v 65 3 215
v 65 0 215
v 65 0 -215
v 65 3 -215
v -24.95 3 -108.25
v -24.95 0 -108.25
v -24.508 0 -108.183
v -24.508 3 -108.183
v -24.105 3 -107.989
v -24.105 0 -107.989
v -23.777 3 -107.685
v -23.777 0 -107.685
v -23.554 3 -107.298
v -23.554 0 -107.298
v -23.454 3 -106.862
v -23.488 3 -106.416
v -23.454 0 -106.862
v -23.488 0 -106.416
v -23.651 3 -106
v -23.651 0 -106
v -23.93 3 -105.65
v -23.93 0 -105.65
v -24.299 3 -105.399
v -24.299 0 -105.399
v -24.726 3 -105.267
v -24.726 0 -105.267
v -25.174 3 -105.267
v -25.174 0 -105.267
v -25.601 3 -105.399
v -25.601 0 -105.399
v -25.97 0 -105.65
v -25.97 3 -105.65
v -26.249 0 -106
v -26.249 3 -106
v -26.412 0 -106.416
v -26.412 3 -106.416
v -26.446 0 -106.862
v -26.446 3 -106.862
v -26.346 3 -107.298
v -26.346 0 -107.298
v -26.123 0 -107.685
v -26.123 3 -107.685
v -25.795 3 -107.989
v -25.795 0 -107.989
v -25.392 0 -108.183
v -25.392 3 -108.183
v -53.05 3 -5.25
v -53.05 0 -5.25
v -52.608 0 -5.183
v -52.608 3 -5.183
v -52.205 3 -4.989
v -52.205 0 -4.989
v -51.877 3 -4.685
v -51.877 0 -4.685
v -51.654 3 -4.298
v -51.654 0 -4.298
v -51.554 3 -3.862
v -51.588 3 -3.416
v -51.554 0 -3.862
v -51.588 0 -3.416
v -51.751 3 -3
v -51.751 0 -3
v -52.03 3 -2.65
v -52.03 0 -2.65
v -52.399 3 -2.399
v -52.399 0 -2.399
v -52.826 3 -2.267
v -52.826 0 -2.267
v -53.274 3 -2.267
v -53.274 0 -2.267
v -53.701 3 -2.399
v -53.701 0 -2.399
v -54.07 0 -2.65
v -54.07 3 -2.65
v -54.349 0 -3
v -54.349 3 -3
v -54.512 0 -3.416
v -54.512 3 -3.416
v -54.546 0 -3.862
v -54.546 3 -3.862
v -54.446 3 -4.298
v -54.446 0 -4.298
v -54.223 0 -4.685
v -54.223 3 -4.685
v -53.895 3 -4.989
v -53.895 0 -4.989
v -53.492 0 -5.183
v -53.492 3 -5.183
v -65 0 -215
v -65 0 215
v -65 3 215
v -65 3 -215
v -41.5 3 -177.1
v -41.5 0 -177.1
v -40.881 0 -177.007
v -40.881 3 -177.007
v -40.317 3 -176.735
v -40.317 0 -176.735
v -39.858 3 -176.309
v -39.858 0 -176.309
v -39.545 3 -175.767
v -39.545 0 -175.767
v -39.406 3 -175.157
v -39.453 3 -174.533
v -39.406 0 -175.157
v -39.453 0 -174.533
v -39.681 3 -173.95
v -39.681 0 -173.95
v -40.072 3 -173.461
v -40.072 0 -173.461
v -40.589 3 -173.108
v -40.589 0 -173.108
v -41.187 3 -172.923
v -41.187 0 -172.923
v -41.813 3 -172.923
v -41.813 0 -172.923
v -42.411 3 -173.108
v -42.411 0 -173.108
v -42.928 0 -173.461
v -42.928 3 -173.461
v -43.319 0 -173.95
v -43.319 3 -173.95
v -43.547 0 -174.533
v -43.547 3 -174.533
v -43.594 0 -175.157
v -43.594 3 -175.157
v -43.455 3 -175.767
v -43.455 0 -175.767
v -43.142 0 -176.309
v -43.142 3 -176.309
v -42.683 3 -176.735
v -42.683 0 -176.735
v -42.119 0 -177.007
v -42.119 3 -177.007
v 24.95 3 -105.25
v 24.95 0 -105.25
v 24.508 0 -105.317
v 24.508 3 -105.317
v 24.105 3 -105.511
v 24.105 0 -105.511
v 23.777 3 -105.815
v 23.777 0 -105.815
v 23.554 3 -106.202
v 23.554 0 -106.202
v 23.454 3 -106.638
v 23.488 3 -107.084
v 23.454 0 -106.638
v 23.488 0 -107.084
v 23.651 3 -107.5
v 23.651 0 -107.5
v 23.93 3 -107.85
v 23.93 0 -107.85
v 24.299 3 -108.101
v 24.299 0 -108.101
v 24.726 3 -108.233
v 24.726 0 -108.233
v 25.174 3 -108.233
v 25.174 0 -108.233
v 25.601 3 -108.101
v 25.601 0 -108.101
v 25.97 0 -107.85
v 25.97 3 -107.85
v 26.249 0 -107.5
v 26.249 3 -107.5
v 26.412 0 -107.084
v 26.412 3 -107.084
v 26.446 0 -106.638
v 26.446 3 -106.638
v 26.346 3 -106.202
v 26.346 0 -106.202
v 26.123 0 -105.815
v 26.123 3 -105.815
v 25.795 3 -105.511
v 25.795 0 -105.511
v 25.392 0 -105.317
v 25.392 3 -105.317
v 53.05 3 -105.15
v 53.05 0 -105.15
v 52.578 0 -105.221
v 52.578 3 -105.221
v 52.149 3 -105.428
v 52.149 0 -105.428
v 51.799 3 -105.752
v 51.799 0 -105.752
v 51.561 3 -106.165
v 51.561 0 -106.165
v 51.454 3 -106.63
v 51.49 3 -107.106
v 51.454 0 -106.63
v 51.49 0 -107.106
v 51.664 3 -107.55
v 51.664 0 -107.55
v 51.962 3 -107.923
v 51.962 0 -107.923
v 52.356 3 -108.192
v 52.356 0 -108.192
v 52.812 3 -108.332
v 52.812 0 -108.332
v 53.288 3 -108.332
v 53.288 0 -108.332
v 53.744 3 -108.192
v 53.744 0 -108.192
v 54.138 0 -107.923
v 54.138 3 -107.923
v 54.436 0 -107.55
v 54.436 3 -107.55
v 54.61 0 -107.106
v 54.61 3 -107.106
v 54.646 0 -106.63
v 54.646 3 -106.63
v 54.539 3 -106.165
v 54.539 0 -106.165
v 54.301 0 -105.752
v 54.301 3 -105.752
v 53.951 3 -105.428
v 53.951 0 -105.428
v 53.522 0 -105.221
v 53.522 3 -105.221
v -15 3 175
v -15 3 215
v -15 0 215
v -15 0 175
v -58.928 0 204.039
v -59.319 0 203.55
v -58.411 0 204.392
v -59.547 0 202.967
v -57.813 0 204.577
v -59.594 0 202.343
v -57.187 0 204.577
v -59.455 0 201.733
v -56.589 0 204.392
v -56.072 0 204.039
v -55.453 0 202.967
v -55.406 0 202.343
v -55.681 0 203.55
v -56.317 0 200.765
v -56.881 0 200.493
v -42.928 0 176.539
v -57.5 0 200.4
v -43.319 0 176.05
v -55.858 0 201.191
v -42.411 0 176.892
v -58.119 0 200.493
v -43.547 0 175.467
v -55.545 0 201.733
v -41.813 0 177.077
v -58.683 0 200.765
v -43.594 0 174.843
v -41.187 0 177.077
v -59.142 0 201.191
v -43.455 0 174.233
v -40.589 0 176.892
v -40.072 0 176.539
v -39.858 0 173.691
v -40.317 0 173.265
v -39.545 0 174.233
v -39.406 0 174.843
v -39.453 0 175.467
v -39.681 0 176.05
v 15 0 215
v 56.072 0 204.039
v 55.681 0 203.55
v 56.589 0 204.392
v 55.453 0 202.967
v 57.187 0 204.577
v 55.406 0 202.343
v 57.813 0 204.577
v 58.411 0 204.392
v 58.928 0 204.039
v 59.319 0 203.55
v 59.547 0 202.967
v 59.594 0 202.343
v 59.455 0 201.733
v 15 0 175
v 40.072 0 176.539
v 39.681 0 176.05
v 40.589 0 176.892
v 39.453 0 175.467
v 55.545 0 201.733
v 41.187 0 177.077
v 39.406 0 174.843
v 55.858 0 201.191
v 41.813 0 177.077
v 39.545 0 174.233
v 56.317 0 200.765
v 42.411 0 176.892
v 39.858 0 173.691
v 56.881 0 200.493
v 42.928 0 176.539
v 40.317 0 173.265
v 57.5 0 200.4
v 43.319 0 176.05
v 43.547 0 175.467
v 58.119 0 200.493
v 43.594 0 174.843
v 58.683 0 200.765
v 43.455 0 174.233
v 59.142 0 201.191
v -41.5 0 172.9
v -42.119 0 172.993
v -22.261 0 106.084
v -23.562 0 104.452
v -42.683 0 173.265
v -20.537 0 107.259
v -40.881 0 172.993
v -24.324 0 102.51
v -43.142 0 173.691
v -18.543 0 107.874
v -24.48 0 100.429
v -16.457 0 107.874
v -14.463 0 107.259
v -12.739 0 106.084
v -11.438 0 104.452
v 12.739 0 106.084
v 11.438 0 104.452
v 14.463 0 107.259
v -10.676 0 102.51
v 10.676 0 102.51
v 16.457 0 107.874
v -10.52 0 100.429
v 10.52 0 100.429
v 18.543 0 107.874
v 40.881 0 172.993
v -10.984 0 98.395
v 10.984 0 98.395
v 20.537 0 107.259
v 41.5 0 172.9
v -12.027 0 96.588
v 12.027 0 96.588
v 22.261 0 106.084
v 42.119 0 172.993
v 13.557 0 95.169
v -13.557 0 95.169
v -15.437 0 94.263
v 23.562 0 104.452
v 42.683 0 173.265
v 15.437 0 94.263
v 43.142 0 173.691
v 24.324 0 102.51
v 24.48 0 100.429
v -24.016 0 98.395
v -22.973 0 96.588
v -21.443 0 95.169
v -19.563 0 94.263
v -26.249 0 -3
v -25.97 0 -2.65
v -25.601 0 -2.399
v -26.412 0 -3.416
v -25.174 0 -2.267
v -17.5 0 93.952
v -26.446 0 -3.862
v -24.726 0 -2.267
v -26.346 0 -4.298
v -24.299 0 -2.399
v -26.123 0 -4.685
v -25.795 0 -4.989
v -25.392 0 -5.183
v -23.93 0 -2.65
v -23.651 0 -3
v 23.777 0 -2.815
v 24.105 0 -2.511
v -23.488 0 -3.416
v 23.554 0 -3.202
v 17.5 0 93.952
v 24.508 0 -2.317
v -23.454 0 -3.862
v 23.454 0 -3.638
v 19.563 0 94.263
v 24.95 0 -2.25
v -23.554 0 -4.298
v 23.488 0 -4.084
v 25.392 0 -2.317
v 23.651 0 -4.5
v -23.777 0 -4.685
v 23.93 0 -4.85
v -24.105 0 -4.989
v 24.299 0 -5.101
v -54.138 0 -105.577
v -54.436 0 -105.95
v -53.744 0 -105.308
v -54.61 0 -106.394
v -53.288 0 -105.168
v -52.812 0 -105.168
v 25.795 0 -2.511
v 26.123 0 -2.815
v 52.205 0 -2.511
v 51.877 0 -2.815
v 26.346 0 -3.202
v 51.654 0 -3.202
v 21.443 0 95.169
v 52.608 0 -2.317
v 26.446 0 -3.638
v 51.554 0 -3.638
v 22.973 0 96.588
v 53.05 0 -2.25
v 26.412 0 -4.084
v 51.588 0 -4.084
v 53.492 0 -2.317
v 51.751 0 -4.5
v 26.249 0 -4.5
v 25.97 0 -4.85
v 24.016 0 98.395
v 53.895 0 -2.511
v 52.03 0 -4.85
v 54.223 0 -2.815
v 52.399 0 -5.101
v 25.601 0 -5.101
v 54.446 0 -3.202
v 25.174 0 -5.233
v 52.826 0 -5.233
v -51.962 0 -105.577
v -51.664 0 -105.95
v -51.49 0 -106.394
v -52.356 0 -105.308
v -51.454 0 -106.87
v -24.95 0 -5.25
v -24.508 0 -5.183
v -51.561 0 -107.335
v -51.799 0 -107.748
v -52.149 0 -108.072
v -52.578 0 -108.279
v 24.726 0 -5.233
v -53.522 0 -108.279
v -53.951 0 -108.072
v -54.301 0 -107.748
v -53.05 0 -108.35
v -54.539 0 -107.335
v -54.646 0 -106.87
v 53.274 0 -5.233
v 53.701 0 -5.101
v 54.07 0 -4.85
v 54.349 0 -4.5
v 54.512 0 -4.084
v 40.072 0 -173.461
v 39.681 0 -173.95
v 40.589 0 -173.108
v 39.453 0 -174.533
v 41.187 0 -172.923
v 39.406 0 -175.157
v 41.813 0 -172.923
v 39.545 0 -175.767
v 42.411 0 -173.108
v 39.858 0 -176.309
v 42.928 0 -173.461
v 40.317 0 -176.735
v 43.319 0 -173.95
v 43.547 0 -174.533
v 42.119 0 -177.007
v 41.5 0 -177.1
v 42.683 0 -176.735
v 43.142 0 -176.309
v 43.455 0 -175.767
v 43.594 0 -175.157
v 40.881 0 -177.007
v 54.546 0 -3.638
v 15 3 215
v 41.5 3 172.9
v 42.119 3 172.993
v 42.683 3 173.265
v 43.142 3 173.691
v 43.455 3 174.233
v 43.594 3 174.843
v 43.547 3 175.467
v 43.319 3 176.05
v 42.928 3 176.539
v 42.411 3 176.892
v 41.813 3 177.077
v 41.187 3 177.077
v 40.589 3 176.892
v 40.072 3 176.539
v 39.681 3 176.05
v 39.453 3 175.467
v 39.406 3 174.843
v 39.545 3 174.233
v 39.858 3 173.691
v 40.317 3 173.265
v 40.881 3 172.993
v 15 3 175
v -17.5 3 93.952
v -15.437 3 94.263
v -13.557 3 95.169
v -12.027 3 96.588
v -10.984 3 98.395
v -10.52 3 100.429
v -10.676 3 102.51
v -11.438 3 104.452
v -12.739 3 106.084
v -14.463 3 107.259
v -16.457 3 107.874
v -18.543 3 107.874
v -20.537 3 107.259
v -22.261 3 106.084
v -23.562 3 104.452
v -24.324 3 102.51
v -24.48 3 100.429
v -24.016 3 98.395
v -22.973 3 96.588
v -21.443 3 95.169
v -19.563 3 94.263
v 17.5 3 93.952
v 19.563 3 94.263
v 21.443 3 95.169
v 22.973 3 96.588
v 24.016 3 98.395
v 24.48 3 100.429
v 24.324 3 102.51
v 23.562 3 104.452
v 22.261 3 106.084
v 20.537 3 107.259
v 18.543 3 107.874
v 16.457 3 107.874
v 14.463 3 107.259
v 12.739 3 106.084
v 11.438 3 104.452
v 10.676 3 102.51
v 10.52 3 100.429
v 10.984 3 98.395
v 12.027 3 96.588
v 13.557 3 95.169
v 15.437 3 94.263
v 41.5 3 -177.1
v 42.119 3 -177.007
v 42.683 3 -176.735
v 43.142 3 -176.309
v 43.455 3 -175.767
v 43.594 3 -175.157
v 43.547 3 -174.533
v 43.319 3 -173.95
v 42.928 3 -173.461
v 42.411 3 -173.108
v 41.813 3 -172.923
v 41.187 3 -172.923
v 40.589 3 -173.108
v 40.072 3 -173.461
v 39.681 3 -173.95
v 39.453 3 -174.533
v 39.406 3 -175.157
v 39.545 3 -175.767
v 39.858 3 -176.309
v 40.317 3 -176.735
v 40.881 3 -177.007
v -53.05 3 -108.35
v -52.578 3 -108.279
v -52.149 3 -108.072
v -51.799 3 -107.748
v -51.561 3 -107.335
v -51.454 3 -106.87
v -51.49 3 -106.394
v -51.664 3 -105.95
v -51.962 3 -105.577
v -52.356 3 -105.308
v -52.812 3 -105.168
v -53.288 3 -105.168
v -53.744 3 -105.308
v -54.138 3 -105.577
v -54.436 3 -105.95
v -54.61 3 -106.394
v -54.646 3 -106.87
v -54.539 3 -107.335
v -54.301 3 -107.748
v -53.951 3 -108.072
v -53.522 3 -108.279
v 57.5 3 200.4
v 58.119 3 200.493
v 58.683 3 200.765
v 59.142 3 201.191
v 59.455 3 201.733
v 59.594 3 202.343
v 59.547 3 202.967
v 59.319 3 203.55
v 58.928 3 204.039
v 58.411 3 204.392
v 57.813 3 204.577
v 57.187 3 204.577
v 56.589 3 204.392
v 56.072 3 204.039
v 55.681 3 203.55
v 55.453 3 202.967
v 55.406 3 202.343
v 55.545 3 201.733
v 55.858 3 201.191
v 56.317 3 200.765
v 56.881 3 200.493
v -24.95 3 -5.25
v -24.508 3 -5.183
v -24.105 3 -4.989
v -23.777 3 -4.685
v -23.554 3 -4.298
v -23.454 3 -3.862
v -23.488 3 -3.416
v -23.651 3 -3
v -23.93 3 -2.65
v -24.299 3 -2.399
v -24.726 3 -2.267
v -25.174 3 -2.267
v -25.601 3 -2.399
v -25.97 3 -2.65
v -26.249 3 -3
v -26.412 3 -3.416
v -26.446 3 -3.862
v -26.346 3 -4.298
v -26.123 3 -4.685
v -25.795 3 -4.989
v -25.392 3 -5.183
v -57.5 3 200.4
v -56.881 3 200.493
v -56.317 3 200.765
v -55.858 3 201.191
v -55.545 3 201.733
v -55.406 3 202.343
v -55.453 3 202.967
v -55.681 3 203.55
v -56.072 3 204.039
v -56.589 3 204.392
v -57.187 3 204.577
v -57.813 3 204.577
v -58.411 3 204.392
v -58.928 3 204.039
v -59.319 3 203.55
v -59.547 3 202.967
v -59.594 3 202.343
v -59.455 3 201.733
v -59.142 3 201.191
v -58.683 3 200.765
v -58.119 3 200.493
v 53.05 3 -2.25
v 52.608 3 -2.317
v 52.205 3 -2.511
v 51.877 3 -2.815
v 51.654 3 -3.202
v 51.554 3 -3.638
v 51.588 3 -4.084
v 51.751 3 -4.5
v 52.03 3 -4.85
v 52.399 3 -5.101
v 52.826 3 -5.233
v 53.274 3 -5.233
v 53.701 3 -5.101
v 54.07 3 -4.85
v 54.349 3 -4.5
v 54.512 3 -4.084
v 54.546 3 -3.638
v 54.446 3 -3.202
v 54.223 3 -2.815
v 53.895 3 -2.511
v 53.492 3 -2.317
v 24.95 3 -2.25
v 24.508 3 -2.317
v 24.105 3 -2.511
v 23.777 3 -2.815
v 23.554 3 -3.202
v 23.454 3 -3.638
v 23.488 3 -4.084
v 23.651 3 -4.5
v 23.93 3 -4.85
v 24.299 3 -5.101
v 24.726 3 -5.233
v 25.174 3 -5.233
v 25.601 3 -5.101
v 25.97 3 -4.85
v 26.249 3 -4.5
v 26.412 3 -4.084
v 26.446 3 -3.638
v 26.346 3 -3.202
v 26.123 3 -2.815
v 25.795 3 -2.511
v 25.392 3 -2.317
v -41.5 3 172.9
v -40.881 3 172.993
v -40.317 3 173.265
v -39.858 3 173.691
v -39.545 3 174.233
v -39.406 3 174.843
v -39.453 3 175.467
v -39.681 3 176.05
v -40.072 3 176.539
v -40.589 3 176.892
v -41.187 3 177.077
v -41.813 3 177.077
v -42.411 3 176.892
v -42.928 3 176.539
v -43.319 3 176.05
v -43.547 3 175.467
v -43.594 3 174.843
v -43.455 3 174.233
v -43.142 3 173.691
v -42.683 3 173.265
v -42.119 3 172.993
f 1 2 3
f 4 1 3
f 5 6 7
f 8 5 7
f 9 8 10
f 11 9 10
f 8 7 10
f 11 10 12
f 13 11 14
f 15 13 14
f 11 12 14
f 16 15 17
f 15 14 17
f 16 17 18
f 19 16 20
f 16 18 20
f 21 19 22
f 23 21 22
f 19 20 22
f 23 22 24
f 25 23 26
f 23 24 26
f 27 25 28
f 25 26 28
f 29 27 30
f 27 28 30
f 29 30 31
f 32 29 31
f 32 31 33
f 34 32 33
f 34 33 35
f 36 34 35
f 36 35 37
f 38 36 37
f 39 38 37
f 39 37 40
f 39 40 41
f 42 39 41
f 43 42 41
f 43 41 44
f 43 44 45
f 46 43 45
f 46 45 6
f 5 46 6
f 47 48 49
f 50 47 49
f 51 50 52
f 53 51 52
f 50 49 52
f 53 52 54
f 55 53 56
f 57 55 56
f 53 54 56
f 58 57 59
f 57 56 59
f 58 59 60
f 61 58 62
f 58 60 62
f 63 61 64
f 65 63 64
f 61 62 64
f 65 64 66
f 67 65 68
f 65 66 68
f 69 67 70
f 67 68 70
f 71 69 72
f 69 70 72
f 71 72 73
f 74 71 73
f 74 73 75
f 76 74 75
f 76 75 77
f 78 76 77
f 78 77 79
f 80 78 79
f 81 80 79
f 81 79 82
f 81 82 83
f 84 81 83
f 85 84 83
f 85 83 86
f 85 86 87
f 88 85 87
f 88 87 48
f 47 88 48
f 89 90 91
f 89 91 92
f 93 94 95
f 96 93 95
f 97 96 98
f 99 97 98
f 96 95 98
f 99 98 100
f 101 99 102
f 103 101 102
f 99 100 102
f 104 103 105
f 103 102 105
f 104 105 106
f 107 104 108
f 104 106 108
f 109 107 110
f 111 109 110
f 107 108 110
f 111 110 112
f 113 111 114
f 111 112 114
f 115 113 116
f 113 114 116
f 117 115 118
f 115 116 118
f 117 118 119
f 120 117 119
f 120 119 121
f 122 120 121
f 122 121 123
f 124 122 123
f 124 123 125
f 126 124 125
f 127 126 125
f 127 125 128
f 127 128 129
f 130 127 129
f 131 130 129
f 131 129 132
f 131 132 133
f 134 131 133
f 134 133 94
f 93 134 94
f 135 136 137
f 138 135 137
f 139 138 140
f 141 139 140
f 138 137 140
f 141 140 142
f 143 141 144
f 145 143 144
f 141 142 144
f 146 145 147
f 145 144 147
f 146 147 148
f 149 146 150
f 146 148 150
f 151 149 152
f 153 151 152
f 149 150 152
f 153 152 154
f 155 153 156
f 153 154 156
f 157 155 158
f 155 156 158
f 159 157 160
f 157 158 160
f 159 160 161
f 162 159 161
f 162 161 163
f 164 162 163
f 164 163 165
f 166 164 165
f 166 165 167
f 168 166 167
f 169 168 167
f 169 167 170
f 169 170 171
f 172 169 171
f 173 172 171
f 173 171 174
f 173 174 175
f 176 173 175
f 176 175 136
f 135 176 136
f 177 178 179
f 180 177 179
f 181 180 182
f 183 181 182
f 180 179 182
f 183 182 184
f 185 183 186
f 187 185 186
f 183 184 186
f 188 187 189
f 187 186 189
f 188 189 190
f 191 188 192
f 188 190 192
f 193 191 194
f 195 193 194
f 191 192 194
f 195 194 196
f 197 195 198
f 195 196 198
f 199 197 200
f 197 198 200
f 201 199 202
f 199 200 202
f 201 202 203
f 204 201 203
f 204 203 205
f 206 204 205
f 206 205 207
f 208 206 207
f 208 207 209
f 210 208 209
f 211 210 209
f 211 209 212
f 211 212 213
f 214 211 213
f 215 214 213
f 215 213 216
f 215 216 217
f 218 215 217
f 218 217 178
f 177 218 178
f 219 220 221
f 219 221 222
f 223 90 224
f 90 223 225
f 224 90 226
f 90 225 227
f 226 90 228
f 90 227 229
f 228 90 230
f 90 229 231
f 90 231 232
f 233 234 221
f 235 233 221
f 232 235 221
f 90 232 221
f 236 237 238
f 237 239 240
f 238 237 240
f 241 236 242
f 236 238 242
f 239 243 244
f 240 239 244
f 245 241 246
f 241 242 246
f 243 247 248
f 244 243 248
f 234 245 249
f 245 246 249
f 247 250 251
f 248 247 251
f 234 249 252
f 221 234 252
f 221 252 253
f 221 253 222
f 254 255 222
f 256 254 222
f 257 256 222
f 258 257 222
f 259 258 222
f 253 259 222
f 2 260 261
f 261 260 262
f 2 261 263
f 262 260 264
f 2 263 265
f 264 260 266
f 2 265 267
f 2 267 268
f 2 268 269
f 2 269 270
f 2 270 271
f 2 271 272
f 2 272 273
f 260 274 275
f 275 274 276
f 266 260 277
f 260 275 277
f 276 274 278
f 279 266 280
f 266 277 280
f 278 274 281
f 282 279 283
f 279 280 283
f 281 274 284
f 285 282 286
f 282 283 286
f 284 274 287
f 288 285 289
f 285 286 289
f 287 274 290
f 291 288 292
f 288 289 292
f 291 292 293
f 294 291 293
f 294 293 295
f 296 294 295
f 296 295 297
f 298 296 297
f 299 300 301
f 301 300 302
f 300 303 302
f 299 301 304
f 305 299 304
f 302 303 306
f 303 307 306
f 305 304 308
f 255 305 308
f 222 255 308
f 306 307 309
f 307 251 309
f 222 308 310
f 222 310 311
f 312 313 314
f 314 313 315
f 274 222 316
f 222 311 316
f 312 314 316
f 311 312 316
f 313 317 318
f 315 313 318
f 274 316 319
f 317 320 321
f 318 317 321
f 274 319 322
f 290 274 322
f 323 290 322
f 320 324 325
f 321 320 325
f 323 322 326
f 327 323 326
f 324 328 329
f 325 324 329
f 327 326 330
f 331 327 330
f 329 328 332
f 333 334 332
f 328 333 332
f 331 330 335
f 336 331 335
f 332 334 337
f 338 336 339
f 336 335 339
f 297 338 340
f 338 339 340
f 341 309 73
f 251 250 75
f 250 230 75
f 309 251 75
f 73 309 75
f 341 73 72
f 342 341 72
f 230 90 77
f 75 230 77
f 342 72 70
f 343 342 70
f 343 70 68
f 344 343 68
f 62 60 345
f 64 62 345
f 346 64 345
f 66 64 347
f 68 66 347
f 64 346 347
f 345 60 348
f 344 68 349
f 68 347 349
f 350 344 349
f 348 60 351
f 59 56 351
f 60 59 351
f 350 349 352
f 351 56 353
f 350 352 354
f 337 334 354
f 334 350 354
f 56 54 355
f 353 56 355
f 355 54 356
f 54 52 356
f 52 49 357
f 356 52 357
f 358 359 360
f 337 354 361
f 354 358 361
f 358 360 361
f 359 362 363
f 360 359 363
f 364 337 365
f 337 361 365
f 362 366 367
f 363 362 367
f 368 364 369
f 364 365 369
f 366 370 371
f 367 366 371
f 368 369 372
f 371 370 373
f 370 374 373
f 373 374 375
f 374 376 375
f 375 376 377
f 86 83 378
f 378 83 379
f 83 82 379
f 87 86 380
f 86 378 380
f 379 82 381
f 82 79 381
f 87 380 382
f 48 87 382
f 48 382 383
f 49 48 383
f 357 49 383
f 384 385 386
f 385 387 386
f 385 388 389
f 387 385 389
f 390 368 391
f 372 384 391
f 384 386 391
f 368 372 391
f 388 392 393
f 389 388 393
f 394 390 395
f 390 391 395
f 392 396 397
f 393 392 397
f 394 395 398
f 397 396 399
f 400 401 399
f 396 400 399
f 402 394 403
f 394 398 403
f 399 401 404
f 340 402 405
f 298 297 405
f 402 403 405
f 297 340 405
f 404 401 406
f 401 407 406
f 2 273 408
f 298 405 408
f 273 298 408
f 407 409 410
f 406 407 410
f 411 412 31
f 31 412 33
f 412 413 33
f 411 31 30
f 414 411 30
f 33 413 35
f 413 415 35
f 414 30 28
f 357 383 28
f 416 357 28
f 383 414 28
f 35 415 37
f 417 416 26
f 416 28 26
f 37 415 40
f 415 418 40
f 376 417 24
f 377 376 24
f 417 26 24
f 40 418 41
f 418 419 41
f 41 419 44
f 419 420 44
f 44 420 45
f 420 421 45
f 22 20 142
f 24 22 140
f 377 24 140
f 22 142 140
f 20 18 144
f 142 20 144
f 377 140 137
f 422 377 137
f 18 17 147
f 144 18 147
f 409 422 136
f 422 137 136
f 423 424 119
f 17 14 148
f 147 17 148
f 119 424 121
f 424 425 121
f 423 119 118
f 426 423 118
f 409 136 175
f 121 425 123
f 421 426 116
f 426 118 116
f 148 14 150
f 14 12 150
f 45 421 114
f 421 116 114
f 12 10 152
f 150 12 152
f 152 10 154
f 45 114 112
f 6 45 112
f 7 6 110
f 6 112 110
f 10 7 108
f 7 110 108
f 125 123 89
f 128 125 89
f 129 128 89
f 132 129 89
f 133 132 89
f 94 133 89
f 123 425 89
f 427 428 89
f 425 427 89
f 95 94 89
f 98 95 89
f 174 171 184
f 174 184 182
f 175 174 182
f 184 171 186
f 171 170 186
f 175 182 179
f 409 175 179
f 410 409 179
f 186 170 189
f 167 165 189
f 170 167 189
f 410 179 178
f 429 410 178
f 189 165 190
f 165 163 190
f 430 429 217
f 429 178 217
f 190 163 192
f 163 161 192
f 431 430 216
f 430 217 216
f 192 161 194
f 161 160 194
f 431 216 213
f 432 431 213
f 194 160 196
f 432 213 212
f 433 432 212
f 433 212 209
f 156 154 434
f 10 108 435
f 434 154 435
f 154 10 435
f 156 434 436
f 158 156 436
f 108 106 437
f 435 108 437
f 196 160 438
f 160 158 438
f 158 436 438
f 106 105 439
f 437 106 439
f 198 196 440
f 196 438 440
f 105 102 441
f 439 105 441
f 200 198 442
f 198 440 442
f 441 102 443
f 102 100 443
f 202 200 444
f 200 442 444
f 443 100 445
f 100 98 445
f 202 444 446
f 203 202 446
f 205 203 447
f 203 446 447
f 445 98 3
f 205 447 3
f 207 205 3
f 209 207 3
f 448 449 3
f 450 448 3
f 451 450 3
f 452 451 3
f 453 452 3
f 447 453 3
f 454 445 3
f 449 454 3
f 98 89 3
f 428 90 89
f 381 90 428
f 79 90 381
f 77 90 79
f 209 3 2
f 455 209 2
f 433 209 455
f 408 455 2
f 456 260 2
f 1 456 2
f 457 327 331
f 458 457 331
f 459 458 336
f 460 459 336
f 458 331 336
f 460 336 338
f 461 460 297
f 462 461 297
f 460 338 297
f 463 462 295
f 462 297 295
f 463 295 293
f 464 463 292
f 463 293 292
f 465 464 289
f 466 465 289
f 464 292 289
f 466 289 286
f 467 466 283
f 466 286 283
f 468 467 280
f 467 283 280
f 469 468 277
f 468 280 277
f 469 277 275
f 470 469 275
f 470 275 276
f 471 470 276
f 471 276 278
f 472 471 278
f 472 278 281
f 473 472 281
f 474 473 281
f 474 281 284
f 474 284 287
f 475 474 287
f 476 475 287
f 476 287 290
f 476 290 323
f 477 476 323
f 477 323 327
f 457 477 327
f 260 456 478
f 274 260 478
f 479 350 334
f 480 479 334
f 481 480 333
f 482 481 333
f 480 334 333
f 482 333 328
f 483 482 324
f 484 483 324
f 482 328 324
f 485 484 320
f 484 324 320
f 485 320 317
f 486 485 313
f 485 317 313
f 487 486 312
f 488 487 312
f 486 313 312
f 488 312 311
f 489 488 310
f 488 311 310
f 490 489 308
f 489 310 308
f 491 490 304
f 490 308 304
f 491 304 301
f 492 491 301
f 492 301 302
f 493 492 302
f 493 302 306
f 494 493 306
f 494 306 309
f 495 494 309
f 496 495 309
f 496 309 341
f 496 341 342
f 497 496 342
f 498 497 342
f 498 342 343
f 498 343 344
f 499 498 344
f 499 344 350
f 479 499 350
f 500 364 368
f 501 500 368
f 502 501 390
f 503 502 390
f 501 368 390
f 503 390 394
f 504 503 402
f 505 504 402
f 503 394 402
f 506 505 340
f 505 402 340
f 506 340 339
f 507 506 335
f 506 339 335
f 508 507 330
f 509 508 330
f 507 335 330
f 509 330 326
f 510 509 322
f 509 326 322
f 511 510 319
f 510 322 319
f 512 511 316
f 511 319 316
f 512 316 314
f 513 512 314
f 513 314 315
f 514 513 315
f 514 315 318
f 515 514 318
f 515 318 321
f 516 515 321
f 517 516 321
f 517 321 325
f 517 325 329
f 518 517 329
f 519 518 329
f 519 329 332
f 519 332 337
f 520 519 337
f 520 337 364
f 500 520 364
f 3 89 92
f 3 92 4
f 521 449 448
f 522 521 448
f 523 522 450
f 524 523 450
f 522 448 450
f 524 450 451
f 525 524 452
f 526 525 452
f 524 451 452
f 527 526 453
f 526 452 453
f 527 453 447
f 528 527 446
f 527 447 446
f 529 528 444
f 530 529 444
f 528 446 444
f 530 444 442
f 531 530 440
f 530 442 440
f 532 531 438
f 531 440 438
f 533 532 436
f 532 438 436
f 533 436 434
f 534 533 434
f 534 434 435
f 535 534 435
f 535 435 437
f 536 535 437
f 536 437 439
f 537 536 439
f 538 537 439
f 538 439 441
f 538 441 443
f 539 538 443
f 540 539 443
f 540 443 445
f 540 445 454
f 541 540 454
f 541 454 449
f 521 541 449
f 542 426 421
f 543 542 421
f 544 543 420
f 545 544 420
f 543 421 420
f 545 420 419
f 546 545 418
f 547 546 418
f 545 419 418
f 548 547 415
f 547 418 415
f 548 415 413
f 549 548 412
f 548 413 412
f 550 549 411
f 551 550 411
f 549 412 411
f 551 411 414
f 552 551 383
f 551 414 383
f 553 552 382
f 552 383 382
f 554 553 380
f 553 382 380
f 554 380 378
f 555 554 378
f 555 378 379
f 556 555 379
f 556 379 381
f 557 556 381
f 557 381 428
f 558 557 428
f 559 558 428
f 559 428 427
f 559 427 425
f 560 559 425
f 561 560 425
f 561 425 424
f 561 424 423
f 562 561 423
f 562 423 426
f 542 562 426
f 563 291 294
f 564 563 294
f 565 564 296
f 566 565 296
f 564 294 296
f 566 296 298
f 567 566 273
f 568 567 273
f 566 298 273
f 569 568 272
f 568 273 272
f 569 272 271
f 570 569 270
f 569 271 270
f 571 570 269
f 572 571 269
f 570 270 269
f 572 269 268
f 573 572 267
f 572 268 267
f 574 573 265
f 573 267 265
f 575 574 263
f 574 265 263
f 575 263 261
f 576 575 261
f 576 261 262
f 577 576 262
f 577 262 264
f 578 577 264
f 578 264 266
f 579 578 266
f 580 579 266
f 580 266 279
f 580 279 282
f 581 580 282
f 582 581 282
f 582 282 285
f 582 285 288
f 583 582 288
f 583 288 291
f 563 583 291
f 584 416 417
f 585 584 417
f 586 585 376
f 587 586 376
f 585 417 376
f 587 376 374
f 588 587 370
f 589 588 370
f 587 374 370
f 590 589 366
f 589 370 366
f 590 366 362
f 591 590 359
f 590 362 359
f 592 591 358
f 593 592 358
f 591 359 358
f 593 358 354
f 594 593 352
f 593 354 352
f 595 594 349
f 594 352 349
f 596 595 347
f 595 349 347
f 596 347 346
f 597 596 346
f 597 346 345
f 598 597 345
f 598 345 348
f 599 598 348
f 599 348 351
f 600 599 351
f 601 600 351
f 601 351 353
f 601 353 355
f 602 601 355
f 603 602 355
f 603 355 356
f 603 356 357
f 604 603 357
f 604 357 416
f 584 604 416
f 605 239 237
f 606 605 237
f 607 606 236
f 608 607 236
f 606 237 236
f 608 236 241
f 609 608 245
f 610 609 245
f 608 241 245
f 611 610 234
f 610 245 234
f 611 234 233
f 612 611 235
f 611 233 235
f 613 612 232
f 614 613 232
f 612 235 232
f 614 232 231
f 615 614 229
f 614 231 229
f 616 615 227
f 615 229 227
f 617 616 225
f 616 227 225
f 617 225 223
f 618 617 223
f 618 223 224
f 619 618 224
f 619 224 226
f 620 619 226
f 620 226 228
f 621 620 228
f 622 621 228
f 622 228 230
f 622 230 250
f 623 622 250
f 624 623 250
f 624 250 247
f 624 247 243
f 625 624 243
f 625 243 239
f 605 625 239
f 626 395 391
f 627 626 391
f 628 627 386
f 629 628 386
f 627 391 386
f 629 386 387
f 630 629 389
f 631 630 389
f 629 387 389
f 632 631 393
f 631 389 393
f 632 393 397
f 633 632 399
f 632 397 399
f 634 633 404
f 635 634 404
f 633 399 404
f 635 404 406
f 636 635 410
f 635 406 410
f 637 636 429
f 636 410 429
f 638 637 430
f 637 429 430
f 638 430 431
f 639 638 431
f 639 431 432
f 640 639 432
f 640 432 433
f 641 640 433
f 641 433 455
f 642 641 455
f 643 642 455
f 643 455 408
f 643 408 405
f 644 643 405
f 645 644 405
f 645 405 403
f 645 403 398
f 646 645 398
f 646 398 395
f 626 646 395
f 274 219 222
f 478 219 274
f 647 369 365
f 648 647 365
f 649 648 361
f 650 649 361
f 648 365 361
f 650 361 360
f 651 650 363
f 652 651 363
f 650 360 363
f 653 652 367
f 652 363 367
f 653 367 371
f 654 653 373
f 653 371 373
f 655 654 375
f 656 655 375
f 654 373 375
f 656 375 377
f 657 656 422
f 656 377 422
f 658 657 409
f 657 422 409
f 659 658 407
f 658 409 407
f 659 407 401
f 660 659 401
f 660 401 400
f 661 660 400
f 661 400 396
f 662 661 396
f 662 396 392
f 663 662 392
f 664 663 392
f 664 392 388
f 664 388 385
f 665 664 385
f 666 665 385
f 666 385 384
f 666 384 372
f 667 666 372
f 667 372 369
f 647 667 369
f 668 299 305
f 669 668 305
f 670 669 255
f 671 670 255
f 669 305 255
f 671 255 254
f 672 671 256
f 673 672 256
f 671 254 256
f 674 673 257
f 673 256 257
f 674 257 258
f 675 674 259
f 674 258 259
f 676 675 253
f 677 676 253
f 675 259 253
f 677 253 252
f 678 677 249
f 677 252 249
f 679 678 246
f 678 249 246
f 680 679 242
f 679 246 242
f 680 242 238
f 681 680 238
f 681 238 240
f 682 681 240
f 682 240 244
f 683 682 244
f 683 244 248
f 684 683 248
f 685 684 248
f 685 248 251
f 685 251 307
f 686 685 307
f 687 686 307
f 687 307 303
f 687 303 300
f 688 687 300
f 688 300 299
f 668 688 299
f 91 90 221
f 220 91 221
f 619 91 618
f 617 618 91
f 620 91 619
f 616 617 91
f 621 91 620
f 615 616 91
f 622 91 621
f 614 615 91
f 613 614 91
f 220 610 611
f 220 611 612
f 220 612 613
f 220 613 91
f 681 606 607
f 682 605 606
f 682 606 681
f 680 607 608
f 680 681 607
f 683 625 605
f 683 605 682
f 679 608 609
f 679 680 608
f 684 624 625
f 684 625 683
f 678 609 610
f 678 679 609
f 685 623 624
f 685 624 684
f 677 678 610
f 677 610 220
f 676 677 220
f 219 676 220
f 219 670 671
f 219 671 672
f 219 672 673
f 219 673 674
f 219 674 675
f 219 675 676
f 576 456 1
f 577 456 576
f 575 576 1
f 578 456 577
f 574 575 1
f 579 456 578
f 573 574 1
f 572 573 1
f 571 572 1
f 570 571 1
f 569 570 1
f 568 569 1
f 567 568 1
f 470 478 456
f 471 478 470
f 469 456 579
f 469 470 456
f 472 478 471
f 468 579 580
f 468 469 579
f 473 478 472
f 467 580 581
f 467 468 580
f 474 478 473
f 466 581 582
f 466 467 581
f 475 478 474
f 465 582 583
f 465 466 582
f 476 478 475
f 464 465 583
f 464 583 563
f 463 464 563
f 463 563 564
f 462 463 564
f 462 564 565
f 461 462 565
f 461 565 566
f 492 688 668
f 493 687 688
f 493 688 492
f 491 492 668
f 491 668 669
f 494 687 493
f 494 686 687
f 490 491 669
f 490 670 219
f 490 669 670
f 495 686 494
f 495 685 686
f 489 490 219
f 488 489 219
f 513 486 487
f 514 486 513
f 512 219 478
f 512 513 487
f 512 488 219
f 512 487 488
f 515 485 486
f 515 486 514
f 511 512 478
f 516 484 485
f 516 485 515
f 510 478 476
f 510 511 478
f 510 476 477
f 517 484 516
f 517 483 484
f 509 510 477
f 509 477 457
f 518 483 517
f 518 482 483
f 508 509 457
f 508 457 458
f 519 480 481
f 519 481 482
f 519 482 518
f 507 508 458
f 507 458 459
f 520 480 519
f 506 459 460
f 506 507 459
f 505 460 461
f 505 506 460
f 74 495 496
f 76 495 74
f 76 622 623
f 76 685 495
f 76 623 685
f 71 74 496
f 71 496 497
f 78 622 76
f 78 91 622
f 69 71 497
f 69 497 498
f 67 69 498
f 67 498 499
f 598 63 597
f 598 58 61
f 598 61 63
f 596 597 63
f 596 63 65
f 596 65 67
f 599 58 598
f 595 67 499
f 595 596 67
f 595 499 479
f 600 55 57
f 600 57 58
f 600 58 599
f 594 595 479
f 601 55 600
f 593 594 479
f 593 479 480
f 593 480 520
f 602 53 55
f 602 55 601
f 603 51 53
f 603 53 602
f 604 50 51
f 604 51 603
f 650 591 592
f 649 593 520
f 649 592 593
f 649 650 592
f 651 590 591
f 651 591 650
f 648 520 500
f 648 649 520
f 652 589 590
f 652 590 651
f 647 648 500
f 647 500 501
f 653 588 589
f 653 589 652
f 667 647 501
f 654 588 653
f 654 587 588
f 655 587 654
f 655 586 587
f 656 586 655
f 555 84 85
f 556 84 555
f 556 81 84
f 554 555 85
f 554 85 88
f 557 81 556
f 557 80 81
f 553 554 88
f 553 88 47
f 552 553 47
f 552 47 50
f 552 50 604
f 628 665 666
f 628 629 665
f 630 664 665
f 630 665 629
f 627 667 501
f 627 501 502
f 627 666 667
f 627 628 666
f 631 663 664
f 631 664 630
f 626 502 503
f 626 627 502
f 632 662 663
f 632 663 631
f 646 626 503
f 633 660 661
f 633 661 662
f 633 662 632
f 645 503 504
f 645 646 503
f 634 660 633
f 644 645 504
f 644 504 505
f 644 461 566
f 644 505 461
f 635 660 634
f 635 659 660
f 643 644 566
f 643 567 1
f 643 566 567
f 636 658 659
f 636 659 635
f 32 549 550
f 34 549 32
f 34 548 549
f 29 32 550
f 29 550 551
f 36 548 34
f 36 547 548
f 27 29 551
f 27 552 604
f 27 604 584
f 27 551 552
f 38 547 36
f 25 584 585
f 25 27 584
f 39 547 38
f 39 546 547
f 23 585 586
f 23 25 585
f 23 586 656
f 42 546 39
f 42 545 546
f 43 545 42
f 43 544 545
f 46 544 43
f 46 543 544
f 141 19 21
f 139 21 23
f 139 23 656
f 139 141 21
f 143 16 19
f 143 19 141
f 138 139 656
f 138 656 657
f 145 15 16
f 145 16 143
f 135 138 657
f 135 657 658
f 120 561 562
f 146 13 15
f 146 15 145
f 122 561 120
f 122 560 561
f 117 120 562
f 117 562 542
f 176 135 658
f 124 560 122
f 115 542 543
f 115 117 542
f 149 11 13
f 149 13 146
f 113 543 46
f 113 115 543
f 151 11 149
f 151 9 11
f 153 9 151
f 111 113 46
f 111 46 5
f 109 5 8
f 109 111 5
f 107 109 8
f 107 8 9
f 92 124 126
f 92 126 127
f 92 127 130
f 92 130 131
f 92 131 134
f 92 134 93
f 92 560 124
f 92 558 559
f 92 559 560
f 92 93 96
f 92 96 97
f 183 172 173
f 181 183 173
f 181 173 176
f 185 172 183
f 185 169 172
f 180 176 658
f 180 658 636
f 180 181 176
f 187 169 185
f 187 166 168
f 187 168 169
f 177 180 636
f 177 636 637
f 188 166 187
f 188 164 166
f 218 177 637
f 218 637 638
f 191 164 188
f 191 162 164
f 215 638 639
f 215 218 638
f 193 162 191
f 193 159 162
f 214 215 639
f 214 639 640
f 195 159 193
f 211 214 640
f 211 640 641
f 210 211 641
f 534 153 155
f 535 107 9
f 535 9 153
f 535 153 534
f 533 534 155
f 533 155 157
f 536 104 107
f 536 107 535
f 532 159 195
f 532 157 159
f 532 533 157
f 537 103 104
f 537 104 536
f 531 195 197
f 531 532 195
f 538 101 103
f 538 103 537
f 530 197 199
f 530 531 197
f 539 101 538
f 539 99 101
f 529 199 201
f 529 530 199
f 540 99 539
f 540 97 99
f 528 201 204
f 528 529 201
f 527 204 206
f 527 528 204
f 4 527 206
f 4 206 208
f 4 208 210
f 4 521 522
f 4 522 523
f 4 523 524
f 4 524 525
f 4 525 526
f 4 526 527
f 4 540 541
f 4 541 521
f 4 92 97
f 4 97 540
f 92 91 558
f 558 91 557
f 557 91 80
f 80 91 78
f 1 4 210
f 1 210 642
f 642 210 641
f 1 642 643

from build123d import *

# Parameters (mm, degrees)
SKETCH1_W           = 130
SKETCH1_H           = 430
BOSS_EXTRUDE1_DEPTH = 3
SKETCH2_W           = 30
SKETCH2_H           = 40
CUT_EXTRUDE1_DEPTH  = 10
SKETCH3_R           = 1.5
SKETCH3_R_2         = 1.6
SKETCH3_R_3         = 2.1
CUT_EXTRUDE2_DEPTH  = 10
SKETCH4_R           = 7
CUT_EXTRUDE3_DEPTH  = 10


with BuildPart() as part:
    # Sketch1 → Boss-Extrude1 (new body)
    with BuildSketch(Plane(origin=(0, 0, 0), x_dir=(1, 0, 0), z_dir=(0, 1, 0))):
        Rectangle(SKETCH1_W, SKETCH1_H)
    extrude(amount=BOSS_EXTRUDE1_DEPTH)

    # Sketch2 → Cut-Extrude1 (cut)
    with BuildSketch(Plane(origin=(0, 3, 0), x_dir=(1, 0, 0), z_dir=(0, 1, 0))):
        with Locations((0, -195)):
            Rectangle(SKETCH2_W, SKETCH2_H)
    extrude(amount=-CUT_EXTRUDE1_DEPTH, mode=Mode.SUBTRACT)

    # Sketch3 → Cut-Extrude2 (cut)
    with BuildSketch(Plane.XZ):
        with Locations(Location((-53.05, -3.75, 0), (0, 0, 270))):
            Circle(SKETCH3_R)
        with Locations(Location((-24.95, -3.75, 0), (0, 0, 270))):
            Circle(SKETCH3_R)
        with Locations(Location((-53.05, -106.75, 0), (0, 0, 270))):
            Circle(SKETCH3_R_2)
        with Locations(Location((-24.95, -106.75, 0), (0, 0, 270))):
            Circle(SKETCH3_R)
        with Locations(Location((24.95, -106.75, 0), (0, 0, 90))):
            Circle(SKETCH3_R)
        with Locations(Location((57.5, 202.5, 0), (0, 0, 270))):
            Circle(SKETCH3_R_3)
        with Locations(Location((53.05, -106.75, 0), (0, 0, 90))):
            Circle(SKETCH3_R_2)
        with Locations(Location((24.95, -3.75, 0), (0, 0, 90))):
            Circle(SKETCH3_R)
        with Locations(Location((-57.5, 202.5, 0), (0, 0, 270))):
            Circle(SKETCH3_R_3)
        with Locations(Location((53.05, -3.75, 0), (0, 0, 90))):
            Circle(SKETCH3_R)
        with Locations(Location((-41.5, 175, 0), (0, 0, 270))):
            Circle(SKETCH3_R_3)
        with Locations(Location((41.5, 175, 0), (0, 0, 270))):
            Circle(SKETCH3_R_3)
        with Locations(Location((41.5, -175, 0), (0, 0, 270))):
            Circle(SKETCH3_R_3)
        with Locations(Location((-41.5, -175, 0), (0, 0, 270))):
            Circle(SKETCH3_R_3)
    extrude(amount=-CUT_EXTRUDE2_DEPTH, mode=Mode.SUBTRACT)

    # Sketch4 → Cut-Extrude3 (cut)
    with BuildSketch(Plane.XZ):
        with Locations(Location((-17.5, 100.952208061, 0), (0, 0, 270))):
            Circle(SKETCH4_R)
        with Locations(Location((17.5, 100.952208061, 0), (0, 0, 270))):
            Circle(SKETCH4_R)
    extrude(amount=-CUT_EXTRUDE3_DEPTH, mode=Mode.SUBTRACT)


solid = part.part
